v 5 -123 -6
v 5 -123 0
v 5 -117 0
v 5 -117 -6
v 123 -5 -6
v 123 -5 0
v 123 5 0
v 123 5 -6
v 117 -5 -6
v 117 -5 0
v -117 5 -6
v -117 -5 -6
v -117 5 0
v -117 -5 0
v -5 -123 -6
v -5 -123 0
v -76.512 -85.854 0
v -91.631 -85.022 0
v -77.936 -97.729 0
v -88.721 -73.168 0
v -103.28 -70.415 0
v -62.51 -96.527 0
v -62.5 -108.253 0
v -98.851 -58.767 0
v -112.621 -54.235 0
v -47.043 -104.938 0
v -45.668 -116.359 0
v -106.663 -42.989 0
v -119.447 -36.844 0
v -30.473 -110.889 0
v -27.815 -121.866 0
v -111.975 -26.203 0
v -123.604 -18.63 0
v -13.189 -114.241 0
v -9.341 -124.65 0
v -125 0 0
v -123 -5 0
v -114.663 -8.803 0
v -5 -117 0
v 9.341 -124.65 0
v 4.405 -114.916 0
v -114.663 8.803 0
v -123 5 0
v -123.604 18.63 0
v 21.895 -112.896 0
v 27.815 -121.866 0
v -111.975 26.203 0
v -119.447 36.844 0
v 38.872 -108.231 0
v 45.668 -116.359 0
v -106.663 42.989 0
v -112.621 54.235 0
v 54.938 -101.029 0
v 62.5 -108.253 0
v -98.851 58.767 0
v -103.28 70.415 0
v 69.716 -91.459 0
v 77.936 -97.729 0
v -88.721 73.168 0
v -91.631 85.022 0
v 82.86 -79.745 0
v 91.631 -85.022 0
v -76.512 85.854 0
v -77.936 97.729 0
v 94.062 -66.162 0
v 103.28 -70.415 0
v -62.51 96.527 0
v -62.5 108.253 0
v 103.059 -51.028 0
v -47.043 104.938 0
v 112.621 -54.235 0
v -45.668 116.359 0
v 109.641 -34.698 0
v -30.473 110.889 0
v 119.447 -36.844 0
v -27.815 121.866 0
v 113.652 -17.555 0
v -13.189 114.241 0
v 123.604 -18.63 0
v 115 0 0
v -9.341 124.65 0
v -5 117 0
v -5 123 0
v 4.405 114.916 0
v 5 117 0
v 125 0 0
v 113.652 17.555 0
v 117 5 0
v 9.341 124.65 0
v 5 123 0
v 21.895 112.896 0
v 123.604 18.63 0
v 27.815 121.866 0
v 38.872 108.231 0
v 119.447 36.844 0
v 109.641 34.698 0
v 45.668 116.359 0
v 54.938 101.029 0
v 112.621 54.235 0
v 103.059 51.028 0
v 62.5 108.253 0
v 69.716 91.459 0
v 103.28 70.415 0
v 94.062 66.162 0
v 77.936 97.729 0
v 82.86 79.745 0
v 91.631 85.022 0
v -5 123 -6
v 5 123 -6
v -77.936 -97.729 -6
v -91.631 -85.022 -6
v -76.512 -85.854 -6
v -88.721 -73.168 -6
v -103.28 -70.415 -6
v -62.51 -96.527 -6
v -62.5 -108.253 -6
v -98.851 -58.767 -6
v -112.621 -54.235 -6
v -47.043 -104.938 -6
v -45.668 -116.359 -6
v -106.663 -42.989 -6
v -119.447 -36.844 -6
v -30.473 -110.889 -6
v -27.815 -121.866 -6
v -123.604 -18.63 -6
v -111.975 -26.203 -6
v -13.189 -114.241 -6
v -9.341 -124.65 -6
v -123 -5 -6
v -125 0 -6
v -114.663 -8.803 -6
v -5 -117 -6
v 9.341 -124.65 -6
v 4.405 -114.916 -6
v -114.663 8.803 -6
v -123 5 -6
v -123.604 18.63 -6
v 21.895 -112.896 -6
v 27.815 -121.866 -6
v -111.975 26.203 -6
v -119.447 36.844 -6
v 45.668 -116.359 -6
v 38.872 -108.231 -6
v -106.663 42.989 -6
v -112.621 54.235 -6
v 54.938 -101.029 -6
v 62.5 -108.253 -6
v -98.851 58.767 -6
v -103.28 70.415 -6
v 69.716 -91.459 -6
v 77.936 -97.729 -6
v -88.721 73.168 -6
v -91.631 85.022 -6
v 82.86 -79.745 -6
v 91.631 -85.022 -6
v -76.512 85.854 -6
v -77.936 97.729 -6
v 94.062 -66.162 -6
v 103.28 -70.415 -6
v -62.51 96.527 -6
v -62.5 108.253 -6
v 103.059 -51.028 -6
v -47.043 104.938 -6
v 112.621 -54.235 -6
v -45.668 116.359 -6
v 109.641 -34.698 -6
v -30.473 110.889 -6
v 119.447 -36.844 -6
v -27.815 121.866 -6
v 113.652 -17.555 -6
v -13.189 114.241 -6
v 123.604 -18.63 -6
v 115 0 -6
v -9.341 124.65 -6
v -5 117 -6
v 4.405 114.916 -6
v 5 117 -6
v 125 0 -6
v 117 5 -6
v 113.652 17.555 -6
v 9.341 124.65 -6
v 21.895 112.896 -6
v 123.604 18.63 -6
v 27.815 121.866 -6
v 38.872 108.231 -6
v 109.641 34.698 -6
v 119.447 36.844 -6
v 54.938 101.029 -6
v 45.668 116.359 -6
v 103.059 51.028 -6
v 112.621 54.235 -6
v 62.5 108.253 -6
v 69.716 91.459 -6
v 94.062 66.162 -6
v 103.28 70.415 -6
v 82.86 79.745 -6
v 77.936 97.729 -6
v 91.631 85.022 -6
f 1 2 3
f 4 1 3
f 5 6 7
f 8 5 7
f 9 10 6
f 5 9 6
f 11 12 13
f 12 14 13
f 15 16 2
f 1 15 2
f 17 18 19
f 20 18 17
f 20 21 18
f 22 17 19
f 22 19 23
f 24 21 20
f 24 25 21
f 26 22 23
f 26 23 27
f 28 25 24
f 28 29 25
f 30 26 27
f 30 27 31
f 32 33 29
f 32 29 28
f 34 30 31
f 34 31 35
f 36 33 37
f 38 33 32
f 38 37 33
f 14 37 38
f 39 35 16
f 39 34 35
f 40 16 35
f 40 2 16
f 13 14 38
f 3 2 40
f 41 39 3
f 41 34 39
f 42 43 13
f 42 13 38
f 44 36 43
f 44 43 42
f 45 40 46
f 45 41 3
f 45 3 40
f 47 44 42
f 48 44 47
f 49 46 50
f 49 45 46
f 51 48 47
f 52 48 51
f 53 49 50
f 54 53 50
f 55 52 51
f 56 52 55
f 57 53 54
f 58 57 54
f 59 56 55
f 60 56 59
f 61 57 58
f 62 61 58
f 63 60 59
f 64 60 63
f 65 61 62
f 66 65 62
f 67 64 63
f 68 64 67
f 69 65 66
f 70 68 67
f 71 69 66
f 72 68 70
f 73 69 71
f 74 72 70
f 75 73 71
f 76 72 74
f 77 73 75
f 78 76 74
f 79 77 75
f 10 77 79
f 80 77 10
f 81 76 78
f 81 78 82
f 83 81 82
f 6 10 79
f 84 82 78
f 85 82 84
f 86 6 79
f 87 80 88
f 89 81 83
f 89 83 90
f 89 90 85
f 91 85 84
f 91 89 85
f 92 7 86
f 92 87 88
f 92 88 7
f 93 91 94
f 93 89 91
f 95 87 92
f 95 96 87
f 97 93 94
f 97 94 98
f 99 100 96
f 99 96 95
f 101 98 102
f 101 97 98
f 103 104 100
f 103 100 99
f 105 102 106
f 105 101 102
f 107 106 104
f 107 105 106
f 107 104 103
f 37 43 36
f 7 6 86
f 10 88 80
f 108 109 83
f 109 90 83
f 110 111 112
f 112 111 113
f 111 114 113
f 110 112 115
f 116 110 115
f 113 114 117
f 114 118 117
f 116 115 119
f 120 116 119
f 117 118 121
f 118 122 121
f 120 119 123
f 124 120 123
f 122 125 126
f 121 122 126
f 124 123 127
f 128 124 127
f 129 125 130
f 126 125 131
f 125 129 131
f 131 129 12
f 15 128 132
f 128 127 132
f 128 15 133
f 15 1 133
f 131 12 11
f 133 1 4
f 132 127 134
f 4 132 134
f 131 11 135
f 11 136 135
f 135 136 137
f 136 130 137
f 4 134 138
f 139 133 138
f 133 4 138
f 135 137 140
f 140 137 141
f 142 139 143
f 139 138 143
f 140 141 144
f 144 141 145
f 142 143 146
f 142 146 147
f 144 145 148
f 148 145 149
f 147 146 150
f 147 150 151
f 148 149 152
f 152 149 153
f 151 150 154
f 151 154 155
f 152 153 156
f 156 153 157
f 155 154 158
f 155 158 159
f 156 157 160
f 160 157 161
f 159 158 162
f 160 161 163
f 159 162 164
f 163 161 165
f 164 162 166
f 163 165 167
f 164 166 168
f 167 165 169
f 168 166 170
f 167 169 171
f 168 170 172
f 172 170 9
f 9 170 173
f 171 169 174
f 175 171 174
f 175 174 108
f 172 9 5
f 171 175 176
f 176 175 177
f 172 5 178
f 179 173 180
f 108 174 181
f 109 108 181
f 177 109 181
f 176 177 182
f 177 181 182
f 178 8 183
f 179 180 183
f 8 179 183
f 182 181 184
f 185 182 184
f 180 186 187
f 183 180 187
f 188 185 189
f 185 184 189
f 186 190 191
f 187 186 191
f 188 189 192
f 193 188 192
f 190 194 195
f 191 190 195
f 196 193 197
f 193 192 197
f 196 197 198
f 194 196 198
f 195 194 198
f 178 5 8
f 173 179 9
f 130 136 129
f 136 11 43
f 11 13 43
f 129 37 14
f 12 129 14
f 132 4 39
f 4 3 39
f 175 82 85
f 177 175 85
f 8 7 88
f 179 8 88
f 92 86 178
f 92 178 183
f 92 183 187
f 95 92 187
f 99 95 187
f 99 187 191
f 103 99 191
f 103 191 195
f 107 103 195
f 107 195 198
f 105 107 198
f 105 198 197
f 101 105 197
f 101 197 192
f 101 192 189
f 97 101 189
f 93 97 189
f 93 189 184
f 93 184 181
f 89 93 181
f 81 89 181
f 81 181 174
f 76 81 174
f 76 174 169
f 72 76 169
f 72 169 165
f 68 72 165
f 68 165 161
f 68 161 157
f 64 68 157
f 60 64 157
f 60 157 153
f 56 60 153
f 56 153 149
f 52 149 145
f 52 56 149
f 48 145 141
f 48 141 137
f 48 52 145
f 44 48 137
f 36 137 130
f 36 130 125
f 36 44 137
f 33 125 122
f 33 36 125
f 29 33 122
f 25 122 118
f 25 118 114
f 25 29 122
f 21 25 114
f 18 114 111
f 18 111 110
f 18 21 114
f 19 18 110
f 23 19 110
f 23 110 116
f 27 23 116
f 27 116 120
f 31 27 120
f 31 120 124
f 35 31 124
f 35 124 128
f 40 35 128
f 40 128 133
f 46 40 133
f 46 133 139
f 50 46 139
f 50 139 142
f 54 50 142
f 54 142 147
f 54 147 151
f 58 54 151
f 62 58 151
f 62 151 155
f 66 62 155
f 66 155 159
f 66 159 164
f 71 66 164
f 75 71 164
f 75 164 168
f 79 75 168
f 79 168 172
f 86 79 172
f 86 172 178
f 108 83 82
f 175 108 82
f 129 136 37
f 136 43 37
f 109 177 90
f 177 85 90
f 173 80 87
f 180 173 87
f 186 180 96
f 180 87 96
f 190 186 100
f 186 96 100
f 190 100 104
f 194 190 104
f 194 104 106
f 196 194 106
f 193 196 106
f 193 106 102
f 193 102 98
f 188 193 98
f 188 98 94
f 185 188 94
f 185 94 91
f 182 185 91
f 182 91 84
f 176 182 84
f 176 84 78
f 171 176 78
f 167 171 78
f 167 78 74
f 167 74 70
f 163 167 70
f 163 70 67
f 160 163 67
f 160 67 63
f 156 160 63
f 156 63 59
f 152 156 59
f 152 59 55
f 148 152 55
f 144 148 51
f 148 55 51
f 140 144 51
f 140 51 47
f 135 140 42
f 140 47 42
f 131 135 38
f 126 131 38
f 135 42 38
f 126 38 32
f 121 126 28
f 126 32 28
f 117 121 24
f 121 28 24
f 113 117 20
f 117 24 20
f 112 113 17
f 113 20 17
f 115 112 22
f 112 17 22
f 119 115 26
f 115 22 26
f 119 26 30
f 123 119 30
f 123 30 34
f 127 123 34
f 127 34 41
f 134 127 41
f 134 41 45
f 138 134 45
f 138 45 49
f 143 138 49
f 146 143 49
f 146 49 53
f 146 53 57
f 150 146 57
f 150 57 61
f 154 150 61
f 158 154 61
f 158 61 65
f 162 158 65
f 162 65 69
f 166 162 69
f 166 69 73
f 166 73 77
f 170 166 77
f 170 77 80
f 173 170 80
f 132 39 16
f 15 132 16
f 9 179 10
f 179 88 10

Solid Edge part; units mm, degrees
sketch "Sketch1" plane through (0, 0, 0) normal (0, 0, 1) x (1, 0, 0)
  circle A0 centre (0, 0) radius 125
  dimension "D1" = 250
extrude "Protrusion1" add sketch "Sketch1" against normal blind 6
sketch "Sketch2" plane through (0, 0, 0) normal (0, 0, 1) x (1, 0, 0)
  circle A0 centre (0, 0) radius 115
  dimension "D1" = 230
extrude "Cutout1" cut sketch "Sketch2" against normal through all
sketch "Sketch3" plane through (0, 0, 0) normal (0, 0, 1) x (1, 0, 0)
  line L0 (-5, 117) -> (5, 117)
  line L1 (5, 117) -> (5, 123)
  line L2 (5, 123) -> (-5, 123)
  line L3 (-5, 123) -> (-5, 117)
  dimension "D1" = 10
  dimension "D2" = 6
  dimension "D3" = 117
extrude "Cutout2" cut sketch "Sketch3" against normal through all
pattern_circular "Pattern1" count 4 over 360 about axis through (0, 0, 0) along (0, 0, -1) of "Cutout2"
properties material "Wood, Mahogany"
